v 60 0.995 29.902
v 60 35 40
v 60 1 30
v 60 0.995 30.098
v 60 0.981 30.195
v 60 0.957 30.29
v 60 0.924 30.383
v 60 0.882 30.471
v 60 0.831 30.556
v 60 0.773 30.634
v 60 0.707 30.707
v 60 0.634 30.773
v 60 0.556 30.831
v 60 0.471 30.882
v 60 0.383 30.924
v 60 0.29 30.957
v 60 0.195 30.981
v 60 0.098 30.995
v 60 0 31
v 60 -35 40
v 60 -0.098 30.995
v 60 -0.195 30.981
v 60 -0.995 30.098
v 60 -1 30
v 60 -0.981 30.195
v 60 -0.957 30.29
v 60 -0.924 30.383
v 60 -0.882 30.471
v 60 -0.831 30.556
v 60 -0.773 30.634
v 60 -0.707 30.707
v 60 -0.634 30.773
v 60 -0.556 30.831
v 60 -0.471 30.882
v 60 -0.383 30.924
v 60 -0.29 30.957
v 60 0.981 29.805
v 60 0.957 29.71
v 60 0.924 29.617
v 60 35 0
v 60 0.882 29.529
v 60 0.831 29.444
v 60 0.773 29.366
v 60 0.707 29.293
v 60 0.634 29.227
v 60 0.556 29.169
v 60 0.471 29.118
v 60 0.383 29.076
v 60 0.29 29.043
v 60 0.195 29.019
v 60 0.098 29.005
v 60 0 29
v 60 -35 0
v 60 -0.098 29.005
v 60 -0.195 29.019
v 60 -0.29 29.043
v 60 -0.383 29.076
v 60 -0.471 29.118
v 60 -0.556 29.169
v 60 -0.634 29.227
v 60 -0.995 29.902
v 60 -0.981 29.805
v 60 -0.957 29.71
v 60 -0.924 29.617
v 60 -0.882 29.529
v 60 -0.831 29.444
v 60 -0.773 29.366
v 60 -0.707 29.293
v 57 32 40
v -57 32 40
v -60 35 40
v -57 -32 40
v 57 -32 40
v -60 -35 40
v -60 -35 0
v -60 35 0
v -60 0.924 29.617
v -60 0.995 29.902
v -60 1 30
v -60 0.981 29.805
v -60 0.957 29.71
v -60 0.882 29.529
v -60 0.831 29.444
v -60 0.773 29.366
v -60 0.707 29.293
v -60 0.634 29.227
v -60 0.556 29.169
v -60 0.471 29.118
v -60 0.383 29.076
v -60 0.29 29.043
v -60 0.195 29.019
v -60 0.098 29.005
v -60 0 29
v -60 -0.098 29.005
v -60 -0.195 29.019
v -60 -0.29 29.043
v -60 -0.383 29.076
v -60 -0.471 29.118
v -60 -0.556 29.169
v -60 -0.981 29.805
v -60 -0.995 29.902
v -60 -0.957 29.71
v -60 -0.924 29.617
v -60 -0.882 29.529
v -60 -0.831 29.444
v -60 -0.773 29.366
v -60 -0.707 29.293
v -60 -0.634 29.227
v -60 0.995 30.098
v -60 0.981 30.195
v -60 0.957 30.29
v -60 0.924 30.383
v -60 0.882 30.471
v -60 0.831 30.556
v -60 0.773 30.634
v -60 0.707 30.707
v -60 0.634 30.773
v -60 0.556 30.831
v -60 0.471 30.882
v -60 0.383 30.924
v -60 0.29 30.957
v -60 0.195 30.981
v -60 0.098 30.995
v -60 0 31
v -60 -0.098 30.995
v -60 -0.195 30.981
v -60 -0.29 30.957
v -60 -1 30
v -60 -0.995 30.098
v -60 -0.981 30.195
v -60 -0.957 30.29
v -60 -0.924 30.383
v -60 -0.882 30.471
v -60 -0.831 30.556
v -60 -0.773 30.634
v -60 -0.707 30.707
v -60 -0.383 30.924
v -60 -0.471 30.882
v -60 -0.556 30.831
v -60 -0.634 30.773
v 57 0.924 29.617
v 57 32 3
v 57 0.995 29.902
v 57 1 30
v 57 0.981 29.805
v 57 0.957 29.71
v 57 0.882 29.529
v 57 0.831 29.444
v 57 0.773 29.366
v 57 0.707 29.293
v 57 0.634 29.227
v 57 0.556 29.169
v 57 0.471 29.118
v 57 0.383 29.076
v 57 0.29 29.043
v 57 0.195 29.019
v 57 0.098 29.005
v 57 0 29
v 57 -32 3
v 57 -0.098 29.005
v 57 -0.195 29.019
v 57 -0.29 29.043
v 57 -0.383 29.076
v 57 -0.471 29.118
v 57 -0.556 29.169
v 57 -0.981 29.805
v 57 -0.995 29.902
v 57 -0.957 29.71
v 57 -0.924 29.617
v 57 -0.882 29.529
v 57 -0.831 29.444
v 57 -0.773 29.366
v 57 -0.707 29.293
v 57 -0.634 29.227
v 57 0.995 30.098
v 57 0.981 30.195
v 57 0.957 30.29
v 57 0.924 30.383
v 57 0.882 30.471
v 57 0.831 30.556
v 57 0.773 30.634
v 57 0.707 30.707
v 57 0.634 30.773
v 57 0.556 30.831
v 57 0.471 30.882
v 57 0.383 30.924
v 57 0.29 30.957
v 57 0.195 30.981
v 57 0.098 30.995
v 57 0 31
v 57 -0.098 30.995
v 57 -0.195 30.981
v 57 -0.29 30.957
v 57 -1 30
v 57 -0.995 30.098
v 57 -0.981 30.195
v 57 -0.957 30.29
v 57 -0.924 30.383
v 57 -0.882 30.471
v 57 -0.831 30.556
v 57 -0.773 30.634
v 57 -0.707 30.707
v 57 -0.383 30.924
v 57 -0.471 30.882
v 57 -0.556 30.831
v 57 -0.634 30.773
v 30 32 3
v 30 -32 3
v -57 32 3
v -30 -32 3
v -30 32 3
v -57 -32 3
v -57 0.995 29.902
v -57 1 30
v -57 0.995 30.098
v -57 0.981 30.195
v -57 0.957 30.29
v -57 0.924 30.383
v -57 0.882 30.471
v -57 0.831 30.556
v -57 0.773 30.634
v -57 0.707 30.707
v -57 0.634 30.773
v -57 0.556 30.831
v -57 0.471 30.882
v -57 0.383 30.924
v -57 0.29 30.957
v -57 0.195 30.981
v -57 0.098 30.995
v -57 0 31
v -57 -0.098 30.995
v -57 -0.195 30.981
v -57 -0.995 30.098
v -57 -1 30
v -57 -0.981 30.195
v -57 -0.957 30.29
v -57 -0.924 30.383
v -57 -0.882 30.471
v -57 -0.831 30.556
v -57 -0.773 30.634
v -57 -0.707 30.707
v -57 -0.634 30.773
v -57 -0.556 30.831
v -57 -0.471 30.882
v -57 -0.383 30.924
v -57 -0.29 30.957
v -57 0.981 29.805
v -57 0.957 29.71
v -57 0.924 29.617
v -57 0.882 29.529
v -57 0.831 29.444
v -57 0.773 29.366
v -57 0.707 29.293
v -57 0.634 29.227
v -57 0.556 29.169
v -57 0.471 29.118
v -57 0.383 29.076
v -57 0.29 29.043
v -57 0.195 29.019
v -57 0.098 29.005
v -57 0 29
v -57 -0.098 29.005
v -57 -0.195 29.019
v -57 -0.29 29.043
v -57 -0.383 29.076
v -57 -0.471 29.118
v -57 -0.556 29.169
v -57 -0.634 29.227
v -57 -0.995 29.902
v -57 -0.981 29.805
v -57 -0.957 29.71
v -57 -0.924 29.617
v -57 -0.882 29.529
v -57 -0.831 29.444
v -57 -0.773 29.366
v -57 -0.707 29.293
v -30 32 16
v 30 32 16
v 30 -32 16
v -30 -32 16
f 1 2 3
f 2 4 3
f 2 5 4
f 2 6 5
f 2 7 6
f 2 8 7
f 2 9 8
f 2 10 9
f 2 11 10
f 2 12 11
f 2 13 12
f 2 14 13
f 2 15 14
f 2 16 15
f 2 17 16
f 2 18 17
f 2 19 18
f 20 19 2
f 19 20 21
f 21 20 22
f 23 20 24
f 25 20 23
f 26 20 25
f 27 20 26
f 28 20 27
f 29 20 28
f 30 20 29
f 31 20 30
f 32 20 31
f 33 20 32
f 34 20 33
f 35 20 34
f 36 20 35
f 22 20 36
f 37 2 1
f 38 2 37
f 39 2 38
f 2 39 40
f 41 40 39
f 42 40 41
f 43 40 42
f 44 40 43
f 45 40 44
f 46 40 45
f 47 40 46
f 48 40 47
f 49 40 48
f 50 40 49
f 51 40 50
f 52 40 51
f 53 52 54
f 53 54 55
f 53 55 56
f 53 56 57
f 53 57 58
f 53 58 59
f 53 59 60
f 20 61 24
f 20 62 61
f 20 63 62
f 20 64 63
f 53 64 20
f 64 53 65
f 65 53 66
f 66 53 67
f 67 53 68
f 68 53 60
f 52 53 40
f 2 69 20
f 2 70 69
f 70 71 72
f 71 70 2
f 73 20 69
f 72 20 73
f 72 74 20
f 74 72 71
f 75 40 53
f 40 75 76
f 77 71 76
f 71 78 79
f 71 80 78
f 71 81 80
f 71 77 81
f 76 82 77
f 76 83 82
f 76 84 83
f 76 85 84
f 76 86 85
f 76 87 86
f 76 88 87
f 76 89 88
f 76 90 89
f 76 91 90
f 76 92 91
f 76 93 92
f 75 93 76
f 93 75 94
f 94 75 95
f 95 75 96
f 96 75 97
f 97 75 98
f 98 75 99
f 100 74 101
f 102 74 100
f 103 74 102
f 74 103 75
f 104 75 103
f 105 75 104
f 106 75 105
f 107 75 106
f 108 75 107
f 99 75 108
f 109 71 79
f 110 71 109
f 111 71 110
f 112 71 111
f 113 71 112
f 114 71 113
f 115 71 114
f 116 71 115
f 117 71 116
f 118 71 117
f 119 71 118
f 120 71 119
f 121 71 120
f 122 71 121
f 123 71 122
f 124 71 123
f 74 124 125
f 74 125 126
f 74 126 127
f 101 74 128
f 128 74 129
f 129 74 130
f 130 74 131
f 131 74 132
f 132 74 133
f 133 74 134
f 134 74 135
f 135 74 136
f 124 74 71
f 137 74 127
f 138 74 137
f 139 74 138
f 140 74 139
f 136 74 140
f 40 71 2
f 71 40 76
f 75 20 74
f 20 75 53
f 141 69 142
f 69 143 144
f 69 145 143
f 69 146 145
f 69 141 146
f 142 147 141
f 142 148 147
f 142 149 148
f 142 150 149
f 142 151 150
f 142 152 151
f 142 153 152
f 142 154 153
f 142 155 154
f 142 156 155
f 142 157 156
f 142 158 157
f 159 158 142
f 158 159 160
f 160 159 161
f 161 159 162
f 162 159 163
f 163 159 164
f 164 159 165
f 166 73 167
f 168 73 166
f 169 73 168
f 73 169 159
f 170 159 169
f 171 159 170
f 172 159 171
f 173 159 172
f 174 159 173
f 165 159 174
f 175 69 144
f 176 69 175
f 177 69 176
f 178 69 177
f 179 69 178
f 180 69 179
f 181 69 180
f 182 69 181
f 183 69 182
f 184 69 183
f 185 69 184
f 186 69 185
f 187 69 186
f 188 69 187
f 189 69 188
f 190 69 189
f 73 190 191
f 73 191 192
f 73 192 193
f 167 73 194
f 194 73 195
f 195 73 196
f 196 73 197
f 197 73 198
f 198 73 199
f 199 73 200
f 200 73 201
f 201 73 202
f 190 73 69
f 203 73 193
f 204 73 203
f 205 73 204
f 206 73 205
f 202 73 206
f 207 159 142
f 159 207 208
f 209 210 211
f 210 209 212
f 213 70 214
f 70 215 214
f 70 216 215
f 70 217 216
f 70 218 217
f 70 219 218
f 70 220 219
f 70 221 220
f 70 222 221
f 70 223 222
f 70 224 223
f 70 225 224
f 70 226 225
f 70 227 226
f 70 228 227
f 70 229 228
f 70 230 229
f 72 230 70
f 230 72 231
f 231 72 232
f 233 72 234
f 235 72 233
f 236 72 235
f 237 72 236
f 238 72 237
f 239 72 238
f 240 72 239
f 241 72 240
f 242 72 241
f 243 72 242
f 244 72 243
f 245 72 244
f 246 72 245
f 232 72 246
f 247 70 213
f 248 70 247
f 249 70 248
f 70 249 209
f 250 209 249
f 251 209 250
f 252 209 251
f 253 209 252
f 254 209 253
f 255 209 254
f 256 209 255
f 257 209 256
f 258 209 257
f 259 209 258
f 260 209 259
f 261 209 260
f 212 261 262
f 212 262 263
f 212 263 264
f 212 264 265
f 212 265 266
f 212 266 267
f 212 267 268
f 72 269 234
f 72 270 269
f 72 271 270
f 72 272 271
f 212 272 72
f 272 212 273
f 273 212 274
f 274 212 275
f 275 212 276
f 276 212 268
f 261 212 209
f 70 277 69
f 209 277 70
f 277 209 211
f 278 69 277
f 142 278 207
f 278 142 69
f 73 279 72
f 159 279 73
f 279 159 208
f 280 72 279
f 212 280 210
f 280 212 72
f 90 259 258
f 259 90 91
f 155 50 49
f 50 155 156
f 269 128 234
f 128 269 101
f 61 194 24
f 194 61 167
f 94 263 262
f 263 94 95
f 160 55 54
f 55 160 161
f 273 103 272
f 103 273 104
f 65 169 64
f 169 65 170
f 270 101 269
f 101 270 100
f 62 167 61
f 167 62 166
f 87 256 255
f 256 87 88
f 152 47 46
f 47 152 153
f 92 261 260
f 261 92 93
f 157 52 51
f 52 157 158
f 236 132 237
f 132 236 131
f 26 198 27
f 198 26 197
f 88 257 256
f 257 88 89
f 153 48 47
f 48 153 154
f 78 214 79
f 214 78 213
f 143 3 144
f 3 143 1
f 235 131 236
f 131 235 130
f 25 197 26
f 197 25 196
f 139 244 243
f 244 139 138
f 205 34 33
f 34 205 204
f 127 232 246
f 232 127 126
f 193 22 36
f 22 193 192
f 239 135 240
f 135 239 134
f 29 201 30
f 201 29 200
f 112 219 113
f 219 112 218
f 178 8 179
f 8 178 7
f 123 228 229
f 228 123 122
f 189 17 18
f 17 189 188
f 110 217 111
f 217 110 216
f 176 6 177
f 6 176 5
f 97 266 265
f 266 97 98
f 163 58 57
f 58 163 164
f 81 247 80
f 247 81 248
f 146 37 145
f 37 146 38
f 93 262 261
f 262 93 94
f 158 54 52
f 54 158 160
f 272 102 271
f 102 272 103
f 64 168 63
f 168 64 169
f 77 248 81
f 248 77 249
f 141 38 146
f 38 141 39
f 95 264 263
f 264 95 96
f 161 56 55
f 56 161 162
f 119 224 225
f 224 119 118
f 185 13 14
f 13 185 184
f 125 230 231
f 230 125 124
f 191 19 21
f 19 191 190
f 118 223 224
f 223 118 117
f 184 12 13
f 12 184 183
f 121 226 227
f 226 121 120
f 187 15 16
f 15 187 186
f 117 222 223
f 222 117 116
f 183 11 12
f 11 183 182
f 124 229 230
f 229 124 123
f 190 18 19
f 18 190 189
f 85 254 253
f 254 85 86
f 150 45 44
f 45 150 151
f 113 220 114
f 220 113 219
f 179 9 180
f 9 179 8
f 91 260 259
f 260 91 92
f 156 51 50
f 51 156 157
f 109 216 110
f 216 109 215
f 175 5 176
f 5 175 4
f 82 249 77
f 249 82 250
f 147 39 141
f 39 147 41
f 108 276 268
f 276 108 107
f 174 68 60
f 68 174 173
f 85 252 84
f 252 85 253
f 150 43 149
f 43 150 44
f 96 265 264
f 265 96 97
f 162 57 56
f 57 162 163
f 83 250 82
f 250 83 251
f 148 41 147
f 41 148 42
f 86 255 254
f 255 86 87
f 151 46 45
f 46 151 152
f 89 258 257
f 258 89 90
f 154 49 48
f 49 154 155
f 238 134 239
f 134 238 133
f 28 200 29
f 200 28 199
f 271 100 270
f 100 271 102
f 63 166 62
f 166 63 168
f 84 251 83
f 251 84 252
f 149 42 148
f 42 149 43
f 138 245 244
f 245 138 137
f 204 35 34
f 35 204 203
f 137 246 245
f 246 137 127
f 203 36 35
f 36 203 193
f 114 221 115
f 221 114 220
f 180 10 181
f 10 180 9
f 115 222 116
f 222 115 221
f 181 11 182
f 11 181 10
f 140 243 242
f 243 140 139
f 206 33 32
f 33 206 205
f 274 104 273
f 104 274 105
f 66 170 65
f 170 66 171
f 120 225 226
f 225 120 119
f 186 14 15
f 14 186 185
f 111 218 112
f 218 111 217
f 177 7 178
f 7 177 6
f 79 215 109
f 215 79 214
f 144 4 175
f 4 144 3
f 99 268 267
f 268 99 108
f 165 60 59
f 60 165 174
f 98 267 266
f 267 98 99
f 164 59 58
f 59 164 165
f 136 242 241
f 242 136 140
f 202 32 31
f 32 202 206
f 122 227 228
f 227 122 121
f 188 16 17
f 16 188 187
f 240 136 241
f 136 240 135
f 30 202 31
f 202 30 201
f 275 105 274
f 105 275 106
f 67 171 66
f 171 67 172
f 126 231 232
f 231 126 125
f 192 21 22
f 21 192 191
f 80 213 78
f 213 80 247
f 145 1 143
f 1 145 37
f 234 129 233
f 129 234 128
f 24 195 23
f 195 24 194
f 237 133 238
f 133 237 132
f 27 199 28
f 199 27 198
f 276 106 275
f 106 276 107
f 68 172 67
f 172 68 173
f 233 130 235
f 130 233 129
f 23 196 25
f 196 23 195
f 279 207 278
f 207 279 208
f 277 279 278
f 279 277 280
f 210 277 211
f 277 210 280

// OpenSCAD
// --- Dimensions (mm) ---
outer_x = 120;          // Total length of the tank
outer_y = 70;           // Total width of the tank
outer_z = 40;           // Total height of the tank
wall_thickness = 3;     // Thickness of the side walls
floor_thickness = 3;    // Thickness of the bottom floor

platform_length = 60;    // Length of the central platform along X
platform_height_from_floor = 13; // Height of the platform top relative to the inner floor
platform_width = outer_y - 2*wall_thickness; // Platform spans the full inner width (Y)

hole_diameter = 2;      // Diameter of the electrode wire holes
hole_y_pos = 0;         // Y position of the holes (relative to center of Y)
hole_z_pos = 30;        // Z position of the holes

// --- Constants ---
$fn = 64;

// --- Implementation ---

// The tank is built in one piece. 
// We start with the outer shell and subtract the interior volume.
// Then we add the platform inside.

module buffer_tank() {
    difference() {
        // Main Outer Body
        cube([outer_x, outer_y, outer_z]);

        // Interior Cavity
        // The cavity starts at floor_thickness and goes to the top.
        // We subtract a slightly taller cube to ensure the top is open.
        translate([wall_thickness, wall_thickness, floor_thickness]) {
            cube([outer_x - 2*wall_thickness, outer_y - 2*wall_thickness, outer_z]);
        }

        // Electrode Wire Holes
        // The user specified holes at y = 0 (center of Y) and z = 30.
        // The previous report showed the holes were being subtracted from the 
        // interior cavity incorrectly or the geometry was misaligned.
        // We place the cylinder at the center of the Y axis (outer_y/2).
        // We extend it through the X-walls.
        translate([-1, outer_y/2, hole_z_pos])
            rotate([0, 90, 0])
                cylinder(d = hole_diameter, h = outer_x + 2);
    }

    // The Platform
    // The platform is inside the tank. 
    // It is centered in X.
    // Its top is at z = floor_thickness + platform_height_from_floor.
    // Its width is the inner width (outer_y - 2*wall_thickness).
    
    translate([
        (outer_x / 2) - (platform_length / 2), 
        wall_thickness, 
        floor_thickness
    ]) {
        cube([
            platform_length, 
            platform_width, 
            platform_height_from_floor
        ]);
    }
}

// Render the part
// The part is centered on the XY plane as requested.
// Bounding box should be X: -60 to 60, Y: -35 to 35, Z: 0 to 40.
translate([-outer_x/2, -outer_y/2, 0])
    buffer_tank();
